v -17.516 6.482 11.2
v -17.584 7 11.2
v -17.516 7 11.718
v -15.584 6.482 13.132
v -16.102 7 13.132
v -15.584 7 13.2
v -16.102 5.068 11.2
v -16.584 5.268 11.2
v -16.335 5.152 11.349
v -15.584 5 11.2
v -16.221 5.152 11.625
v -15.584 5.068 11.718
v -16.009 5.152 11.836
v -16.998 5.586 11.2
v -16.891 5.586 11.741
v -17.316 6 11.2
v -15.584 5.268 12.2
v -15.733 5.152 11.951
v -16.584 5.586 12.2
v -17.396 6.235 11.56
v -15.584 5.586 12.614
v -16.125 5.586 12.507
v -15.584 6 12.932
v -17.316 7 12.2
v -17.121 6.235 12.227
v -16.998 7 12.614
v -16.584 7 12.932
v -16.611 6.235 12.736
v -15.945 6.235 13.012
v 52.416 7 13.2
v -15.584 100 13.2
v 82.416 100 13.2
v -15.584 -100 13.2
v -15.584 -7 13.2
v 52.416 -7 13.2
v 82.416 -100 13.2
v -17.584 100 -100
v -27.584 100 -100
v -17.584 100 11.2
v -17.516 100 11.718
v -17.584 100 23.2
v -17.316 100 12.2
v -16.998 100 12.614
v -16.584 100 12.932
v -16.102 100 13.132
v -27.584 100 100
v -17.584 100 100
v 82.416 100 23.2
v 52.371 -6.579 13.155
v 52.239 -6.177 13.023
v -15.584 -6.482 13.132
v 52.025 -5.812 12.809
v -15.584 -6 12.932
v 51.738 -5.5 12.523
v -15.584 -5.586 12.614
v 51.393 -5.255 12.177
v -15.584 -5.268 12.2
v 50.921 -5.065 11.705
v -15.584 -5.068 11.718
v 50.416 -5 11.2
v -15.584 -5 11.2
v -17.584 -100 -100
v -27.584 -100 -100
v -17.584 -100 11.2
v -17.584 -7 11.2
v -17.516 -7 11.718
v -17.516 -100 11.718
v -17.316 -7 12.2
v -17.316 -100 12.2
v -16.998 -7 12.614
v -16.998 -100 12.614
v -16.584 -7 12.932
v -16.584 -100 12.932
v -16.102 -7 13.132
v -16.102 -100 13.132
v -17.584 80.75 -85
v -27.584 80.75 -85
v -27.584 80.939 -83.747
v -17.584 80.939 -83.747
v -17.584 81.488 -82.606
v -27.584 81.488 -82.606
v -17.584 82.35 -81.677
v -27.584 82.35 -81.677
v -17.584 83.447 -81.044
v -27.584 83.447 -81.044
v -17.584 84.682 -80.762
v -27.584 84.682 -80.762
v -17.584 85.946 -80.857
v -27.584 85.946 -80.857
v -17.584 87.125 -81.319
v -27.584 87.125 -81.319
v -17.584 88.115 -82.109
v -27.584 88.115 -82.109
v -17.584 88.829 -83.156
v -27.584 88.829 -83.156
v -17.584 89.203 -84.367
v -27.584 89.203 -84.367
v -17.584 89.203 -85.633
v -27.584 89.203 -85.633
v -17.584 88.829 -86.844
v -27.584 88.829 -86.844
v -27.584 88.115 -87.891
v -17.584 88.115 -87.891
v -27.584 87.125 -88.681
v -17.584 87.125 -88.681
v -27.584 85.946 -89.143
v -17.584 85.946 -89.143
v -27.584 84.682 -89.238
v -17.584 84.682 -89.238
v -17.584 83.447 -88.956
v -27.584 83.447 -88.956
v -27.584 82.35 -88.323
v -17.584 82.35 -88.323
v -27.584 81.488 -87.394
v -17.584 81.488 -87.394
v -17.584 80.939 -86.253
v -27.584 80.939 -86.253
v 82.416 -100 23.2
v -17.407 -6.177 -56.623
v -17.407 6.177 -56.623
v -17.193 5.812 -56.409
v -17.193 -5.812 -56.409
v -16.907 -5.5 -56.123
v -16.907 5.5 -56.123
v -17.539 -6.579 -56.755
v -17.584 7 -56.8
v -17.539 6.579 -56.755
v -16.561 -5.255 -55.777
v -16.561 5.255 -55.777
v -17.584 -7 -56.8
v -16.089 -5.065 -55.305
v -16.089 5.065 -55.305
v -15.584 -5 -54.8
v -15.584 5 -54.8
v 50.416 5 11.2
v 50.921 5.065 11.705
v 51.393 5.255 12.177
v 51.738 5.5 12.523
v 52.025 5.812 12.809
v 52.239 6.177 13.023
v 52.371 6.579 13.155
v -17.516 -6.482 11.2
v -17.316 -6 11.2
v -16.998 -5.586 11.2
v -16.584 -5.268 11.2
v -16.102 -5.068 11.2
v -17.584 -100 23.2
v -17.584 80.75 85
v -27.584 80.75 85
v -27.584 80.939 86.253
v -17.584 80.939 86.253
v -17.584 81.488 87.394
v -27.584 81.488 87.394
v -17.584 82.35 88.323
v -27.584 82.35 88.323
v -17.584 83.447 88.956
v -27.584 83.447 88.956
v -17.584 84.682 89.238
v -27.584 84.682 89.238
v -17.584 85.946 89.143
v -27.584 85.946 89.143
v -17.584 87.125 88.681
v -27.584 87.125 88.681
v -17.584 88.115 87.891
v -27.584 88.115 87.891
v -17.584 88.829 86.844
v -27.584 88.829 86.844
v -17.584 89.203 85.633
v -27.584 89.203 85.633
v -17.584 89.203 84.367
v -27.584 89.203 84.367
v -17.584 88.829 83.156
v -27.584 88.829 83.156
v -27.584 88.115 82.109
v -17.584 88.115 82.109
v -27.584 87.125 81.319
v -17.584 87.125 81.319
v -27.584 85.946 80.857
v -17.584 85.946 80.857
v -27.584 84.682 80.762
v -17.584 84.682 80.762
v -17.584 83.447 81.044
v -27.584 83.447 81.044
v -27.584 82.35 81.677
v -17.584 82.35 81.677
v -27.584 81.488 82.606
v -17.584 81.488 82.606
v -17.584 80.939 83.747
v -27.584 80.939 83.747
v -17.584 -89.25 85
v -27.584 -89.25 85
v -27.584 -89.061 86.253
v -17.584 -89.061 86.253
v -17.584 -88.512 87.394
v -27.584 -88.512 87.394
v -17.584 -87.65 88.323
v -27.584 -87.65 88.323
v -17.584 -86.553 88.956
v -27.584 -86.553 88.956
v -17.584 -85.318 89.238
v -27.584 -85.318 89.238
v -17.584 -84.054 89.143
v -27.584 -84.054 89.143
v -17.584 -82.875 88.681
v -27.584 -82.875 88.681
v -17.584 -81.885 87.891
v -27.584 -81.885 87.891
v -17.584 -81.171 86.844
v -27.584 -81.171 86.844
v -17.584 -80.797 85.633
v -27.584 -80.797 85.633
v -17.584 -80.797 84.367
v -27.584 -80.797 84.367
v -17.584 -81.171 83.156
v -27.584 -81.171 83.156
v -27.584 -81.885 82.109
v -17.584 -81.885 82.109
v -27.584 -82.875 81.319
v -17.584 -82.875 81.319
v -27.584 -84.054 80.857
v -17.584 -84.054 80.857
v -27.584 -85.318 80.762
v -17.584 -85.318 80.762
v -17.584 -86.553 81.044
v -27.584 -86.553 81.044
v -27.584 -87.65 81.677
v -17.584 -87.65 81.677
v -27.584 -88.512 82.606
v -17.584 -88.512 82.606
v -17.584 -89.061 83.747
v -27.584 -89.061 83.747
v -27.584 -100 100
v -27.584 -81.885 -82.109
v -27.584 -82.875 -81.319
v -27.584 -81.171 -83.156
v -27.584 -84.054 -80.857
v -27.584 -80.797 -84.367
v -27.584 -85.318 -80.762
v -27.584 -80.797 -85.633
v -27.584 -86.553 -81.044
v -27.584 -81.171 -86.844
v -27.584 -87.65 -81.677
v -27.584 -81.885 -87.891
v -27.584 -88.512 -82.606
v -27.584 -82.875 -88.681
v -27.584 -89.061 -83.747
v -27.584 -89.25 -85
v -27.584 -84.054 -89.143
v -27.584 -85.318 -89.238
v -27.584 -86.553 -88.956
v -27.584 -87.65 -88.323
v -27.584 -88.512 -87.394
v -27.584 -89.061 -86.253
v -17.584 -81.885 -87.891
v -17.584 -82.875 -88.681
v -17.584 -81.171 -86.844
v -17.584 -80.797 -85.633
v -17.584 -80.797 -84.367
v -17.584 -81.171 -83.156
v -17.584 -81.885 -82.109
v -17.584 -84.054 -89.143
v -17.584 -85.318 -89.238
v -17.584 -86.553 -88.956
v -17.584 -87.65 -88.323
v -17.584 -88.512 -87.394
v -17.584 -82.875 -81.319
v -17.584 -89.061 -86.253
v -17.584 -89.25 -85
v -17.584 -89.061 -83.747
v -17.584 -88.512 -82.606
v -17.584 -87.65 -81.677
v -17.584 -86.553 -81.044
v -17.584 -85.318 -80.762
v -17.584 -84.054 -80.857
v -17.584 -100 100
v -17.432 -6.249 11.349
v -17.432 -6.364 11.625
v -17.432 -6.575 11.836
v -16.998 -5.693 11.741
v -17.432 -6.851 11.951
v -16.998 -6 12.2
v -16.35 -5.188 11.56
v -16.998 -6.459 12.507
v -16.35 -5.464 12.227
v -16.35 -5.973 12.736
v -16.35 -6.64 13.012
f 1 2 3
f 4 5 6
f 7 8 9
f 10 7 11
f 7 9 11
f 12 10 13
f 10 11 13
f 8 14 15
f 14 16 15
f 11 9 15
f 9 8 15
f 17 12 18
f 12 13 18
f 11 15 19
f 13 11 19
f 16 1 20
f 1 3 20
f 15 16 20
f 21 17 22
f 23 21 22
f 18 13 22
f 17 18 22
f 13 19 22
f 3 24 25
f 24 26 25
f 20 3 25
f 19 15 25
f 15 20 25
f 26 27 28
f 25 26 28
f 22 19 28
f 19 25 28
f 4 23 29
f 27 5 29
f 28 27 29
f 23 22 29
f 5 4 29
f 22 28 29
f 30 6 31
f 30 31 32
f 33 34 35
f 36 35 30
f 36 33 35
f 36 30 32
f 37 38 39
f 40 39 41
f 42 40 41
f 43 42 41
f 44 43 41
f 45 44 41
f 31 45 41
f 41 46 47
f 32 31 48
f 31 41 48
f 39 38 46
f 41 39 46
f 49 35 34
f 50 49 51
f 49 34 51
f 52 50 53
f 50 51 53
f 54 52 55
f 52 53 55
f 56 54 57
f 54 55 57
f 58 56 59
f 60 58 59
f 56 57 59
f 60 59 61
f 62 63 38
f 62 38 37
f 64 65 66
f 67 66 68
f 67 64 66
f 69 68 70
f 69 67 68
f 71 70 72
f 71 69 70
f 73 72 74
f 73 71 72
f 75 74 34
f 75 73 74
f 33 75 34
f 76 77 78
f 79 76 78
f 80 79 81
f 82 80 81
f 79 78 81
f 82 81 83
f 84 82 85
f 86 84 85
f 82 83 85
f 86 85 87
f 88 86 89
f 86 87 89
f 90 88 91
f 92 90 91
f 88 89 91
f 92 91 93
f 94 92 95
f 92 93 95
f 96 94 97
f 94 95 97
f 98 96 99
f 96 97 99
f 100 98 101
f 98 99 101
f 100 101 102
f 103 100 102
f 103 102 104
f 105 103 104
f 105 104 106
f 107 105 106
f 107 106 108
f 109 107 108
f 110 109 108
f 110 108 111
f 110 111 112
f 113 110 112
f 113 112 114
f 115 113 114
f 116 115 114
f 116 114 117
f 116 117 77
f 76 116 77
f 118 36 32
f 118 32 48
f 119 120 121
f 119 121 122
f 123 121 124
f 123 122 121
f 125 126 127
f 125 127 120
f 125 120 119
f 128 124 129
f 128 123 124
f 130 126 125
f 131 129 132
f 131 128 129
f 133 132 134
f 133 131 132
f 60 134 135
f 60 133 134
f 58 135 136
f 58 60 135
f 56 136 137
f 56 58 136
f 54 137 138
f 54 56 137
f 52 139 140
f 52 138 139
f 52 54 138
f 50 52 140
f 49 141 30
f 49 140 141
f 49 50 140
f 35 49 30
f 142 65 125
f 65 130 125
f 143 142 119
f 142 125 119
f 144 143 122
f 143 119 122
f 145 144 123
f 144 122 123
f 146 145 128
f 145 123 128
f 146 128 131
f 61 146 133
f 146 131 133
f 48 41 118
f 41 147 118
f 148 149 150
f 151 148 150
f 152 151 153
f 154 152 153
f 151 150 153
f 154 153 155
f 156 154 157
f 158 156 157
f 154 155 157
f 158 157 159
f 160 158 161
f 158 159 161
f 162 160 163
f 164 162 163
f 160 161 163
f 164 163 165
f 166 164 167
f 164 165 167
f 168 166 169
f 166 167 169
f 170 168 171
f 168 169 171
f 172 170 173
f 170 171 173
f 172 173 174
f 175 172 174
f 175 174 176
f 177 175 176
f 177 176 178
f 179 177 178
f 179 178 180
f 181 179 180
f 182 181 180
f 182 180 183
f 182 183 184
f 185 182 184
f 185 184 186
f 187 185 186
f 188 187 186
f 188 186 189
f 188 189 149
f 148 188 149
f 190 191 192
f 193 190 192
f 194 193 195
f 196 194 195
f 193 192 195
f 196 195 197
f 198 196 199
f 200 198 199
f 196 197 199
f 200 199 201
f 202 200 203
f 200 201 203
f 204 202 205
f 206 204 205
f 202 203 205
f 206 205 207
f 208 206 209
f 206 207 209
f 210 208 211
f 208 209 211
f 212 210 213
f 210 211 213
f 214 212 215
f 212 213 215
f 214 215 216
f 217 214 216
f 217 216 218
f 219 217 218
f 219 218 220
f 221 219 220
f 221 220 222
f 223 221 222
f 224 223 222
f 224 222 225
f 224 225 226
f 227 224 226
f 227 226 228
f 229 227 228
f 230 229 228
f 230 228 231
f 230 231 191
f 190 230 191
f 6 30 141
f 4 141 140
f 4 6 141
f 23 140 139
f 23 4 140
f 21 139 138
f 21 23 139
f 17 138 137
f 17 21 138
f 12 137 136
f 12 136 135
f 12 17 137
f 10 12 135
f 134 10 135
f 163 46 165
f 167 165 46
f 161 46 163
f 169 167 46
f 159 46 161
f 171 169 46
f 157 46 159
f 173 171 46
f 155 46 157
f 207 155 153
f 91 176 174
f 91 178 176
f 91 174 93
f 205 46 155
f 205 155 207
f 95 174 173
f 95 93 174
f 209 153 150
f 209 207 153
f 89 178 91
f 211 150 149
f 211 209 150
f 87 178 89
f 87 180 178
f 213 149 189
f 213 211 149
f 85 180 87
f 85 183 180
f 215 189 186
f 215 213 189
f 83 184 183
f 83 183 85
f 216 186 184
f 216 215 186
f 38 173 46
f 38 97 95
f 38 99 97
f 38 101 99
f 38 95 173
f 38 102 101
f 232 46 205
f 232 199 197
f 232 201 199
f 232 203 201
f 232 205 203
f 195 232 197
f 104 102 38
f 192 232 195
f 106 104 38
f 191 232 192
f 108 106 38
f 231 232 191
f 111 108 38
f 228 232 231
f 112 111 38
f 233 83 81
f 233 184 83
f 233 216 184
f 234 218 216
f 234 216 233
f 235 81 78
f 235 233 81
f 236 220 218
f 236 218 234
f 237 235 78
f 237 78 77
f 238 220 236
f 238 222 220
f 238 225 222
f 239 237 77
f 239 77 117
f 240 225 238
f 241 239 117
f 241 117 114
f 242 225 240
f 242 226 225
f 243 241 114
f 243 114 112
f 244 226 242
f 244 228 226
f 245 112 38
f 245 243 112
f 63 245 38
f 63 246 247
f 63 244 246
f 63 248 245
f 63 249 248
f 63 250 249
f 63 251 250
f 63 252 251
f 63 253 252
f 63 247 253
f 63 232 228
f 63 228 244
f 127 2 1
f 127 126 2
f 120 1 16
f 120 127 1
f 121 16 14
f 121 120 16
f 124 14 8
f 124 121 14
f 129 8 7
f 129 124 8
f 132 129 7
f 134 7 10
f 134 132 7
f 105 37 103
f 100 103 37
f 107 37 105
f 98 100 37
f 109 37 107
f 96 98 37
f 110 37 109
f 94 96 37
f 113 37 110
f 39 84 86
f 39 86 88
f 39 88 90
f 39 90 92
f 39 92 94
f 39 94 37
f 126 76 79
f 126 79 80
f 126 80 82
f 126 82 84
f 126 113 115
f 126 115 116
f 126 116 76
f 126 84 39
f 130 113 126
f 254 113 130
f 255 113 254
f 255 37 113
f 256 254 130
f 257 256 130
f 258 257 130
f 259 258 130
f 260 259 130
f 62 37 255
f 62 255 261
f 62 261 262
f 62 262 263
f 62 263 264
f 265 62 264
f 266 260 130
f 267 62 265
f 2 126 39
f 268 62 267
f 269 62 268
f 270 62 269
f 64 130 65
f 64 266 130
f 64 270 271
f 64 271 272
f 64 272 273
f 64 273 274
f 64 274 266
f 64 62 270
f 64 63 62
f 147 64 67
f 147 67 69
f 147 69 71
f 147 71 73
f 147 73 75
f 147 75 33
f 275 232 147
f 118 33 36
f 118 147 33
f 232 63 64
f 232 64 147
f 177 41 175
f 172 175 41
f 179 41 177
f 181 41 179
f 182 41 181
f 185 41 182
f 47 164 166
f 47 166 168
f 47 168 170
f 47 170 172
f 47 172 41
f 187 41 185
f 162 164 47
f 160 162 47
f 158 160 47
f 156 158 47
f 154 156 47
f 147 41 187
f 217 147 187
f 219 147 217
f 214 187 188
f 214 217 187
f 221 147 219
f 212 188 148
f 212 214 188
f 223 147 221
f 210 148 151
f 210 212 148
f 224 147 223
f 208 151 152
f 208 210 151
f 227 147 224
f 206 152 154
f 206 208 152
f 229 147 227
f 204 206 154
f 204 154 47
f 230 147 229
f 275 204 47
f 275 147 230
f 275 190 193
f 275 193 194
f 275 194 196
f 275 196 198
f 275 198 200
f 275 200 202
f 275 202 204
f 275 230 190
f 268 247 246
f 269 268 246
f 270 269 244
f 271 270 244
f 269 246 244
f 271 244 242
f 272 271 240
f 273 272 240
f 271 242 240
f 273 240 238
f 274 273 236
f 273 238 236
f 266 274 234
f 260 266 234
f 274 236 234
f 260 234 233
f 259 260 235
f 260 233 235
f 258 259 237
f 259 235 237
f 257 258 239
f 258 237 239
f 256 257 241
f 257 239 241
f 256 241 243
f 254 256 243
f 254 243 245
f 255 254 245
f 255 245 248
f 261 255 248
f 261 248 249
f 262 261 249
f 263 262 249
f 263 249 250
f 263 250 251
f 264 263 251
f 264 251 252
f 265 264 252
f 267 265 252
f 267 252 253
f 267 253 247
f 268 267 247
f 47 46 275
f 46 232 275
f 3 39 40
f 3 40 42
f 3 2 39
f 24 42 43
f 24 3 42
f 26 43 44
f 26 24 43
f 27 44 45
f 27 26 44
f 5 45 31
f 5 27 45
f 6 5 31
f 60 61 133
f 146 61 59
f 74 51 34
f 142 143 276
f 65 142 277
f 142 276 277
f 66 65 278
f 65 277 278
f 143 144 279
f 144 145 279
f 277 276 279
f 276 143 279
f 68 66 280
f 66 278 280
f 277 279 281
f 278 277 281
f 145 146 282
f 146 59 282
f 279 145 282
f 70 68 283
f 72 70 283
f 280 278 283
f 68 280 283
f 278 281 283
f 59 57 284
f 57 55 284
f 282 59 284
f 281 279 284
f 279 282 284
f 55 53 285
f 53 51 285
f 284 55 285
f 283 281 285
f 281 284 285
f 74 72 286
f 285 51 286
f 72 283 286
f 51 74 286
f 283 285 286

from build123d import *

# Parameters (mm, degrees)
F0_W     = 10
F0_H     = 76.8
F0_H_2   = 10
F0_W_2   = 100
F0_H_3   = 113.2
F1_DEPTH = 100
F3_DEPTH = 5
F4_R     = 2
F6_D     = 8.5


with BuildPart() as f1:
    # F0 (on Front) → F1 (new body, symmetric)
    with BuildSketch(Plane.XZ):
        with Locations((-22.584166, 61.6)):
            Rectangle(F0_W, F0_H)
        with Locations((-22.584166, 18.2)):
            Rectangle(F0_W, F0_H_2)
        with Locations((32.415834, 18.2)):
            Rectangle(F0_W_2, F0_H_2)
        with Locations((-22.584166, -43.4)):
            Rectangle(F0_W, F0_H_3)
    extrude(amount=F1_DEPTH, both=True)

    # F2 (on Front) → F3 (join, symmetric)
    with BuildSketch(Plane.XZ):
        Polygon((-17.584166, 13.2), (-17.584166, -56.8), (52.415834, 13.2), align=None)
    extrude(amount=F3_DEPTH, both=True)

    # F4
    f4_edges = [f1.edges().sort_by_distance(p)[0] for p in [
        (17.415834, -5, 13.2),
        (-17.584166, -5, -21.8),
        (-17.584166, -52.5, 13.2),
        (-17.584166, 52.5, 13.2),
        (-17.584166, 5, -21.8),
        (17.415834, 5, 13.2),
    ]]
    fillet(f4_edges, radius=F4_R)

    # F6 (through all)
    with Locations(Plane.YZ.offset(-17.584166)):
        with Locations((-85, 85), (85, 85), (85, -85), (-85, -85)):
            Hole(F6_D / 2)


solid = f1.part
